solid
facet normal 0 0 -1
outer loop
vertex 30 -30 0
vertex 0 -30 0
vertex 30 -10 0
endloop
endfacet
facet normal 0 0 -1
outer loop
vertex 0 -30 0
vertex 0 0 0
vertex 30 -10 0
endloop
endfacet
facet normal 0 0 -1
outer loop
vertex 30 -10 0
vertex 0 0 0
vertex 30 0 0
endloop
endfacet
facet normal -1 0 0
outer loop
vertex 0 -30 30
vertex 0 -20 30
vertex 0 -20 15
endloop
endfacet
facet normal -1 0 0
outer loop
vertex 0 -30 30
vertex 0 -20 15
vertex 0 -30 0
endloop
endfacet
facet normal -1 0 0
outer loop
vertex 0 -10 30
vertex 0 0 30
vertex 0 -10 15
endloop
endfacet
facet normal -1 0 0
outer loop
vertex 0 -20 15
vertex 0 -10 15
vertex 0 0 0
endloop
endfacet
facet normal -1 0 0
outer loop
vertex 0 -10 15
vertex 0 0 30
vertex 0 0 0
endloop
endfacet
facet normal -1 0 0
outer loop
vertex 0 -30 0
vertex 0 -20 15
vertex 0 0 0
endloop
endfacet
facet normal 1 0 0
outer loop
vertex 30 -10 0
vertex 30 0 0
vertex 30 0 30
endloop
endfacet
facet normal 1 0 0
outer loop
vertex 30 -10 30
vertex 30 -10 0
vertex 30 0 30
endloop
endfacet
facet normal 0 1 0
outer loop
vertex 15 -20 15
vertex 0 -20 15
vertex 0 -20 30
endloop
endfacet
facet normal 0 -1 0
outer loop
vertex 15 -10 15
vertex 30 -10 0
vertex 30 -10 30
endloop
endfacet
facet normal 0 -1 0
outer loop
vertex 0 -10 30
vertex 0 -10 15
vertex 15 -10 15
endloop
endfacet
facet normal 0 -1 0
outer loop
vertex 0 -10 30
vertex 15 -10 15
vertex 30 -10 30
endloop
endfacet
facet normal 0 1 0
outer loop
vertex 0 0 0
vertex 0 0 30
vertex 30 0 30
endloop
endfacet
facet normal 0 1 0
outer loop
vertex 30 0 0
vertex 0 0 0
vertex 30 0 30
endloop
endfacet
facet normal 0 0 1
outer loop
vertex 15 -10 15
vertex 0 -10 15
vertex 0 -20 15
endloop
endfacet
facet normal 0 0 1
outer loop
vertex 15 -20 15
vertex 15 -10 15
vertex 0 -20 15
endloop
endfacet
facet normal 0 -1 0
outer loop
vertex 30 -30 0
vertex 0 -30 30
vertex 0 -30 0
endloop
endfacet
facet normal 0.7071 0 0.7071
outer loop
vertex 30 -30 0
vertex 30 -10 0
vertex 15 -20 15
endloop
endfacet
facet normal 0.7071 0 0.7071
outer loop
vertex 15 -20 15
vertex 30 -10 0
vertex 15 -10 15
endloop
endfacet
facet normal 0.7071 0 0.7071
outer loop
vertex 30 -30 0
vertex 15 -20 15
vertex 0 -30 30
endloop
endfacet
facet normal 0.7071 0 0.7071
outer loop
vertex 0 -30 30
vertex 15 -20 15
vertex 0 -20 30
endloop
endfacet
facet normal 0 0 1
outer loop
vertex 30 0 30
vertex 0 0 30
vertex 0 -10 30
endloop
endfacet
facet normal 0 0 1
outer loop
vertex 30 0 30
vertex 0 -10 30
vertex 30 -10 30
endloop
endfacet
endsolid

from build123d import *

# Parameters (mm, degrees)
F0_W     = 30
F0_H     = 30
F1_DEPTH = 10
F3_DEPTH = 20
F4_W     = 10
F4_H     = 15
F5_DEPTH = 30.001


with BuildPart() as f1:
    # F0 (on Front) → F1 (new body)
    with BuildSketch(Plane.XZ):
        with Locations((15, 15)):
            Rectangle(F0_W, F0_H)
    extrude(amount=F1_DEPTH)

    # F2 (on face) → F3 (join)
    with BuildSketch(Plane.XZ.offset(10)):
        Polygon((0, 30), (0, 0), (30, 0), align=None)
    extrude(amount=F3_DEPTH)

    # F4 (on face) → F5 (cut, through all)
    with BuildSketch(Plane(origin=(0, 0, 0), x_dir=(0, -1, 0), z_dir=(-1, 0, 0))):
        with Locations((15, 22.5)):
            Rectangle(F4_W, F4_H)
    extrude(amount=-F5_DEPTH, mode=Mode.SUBTRACT)


solid = f1.part
